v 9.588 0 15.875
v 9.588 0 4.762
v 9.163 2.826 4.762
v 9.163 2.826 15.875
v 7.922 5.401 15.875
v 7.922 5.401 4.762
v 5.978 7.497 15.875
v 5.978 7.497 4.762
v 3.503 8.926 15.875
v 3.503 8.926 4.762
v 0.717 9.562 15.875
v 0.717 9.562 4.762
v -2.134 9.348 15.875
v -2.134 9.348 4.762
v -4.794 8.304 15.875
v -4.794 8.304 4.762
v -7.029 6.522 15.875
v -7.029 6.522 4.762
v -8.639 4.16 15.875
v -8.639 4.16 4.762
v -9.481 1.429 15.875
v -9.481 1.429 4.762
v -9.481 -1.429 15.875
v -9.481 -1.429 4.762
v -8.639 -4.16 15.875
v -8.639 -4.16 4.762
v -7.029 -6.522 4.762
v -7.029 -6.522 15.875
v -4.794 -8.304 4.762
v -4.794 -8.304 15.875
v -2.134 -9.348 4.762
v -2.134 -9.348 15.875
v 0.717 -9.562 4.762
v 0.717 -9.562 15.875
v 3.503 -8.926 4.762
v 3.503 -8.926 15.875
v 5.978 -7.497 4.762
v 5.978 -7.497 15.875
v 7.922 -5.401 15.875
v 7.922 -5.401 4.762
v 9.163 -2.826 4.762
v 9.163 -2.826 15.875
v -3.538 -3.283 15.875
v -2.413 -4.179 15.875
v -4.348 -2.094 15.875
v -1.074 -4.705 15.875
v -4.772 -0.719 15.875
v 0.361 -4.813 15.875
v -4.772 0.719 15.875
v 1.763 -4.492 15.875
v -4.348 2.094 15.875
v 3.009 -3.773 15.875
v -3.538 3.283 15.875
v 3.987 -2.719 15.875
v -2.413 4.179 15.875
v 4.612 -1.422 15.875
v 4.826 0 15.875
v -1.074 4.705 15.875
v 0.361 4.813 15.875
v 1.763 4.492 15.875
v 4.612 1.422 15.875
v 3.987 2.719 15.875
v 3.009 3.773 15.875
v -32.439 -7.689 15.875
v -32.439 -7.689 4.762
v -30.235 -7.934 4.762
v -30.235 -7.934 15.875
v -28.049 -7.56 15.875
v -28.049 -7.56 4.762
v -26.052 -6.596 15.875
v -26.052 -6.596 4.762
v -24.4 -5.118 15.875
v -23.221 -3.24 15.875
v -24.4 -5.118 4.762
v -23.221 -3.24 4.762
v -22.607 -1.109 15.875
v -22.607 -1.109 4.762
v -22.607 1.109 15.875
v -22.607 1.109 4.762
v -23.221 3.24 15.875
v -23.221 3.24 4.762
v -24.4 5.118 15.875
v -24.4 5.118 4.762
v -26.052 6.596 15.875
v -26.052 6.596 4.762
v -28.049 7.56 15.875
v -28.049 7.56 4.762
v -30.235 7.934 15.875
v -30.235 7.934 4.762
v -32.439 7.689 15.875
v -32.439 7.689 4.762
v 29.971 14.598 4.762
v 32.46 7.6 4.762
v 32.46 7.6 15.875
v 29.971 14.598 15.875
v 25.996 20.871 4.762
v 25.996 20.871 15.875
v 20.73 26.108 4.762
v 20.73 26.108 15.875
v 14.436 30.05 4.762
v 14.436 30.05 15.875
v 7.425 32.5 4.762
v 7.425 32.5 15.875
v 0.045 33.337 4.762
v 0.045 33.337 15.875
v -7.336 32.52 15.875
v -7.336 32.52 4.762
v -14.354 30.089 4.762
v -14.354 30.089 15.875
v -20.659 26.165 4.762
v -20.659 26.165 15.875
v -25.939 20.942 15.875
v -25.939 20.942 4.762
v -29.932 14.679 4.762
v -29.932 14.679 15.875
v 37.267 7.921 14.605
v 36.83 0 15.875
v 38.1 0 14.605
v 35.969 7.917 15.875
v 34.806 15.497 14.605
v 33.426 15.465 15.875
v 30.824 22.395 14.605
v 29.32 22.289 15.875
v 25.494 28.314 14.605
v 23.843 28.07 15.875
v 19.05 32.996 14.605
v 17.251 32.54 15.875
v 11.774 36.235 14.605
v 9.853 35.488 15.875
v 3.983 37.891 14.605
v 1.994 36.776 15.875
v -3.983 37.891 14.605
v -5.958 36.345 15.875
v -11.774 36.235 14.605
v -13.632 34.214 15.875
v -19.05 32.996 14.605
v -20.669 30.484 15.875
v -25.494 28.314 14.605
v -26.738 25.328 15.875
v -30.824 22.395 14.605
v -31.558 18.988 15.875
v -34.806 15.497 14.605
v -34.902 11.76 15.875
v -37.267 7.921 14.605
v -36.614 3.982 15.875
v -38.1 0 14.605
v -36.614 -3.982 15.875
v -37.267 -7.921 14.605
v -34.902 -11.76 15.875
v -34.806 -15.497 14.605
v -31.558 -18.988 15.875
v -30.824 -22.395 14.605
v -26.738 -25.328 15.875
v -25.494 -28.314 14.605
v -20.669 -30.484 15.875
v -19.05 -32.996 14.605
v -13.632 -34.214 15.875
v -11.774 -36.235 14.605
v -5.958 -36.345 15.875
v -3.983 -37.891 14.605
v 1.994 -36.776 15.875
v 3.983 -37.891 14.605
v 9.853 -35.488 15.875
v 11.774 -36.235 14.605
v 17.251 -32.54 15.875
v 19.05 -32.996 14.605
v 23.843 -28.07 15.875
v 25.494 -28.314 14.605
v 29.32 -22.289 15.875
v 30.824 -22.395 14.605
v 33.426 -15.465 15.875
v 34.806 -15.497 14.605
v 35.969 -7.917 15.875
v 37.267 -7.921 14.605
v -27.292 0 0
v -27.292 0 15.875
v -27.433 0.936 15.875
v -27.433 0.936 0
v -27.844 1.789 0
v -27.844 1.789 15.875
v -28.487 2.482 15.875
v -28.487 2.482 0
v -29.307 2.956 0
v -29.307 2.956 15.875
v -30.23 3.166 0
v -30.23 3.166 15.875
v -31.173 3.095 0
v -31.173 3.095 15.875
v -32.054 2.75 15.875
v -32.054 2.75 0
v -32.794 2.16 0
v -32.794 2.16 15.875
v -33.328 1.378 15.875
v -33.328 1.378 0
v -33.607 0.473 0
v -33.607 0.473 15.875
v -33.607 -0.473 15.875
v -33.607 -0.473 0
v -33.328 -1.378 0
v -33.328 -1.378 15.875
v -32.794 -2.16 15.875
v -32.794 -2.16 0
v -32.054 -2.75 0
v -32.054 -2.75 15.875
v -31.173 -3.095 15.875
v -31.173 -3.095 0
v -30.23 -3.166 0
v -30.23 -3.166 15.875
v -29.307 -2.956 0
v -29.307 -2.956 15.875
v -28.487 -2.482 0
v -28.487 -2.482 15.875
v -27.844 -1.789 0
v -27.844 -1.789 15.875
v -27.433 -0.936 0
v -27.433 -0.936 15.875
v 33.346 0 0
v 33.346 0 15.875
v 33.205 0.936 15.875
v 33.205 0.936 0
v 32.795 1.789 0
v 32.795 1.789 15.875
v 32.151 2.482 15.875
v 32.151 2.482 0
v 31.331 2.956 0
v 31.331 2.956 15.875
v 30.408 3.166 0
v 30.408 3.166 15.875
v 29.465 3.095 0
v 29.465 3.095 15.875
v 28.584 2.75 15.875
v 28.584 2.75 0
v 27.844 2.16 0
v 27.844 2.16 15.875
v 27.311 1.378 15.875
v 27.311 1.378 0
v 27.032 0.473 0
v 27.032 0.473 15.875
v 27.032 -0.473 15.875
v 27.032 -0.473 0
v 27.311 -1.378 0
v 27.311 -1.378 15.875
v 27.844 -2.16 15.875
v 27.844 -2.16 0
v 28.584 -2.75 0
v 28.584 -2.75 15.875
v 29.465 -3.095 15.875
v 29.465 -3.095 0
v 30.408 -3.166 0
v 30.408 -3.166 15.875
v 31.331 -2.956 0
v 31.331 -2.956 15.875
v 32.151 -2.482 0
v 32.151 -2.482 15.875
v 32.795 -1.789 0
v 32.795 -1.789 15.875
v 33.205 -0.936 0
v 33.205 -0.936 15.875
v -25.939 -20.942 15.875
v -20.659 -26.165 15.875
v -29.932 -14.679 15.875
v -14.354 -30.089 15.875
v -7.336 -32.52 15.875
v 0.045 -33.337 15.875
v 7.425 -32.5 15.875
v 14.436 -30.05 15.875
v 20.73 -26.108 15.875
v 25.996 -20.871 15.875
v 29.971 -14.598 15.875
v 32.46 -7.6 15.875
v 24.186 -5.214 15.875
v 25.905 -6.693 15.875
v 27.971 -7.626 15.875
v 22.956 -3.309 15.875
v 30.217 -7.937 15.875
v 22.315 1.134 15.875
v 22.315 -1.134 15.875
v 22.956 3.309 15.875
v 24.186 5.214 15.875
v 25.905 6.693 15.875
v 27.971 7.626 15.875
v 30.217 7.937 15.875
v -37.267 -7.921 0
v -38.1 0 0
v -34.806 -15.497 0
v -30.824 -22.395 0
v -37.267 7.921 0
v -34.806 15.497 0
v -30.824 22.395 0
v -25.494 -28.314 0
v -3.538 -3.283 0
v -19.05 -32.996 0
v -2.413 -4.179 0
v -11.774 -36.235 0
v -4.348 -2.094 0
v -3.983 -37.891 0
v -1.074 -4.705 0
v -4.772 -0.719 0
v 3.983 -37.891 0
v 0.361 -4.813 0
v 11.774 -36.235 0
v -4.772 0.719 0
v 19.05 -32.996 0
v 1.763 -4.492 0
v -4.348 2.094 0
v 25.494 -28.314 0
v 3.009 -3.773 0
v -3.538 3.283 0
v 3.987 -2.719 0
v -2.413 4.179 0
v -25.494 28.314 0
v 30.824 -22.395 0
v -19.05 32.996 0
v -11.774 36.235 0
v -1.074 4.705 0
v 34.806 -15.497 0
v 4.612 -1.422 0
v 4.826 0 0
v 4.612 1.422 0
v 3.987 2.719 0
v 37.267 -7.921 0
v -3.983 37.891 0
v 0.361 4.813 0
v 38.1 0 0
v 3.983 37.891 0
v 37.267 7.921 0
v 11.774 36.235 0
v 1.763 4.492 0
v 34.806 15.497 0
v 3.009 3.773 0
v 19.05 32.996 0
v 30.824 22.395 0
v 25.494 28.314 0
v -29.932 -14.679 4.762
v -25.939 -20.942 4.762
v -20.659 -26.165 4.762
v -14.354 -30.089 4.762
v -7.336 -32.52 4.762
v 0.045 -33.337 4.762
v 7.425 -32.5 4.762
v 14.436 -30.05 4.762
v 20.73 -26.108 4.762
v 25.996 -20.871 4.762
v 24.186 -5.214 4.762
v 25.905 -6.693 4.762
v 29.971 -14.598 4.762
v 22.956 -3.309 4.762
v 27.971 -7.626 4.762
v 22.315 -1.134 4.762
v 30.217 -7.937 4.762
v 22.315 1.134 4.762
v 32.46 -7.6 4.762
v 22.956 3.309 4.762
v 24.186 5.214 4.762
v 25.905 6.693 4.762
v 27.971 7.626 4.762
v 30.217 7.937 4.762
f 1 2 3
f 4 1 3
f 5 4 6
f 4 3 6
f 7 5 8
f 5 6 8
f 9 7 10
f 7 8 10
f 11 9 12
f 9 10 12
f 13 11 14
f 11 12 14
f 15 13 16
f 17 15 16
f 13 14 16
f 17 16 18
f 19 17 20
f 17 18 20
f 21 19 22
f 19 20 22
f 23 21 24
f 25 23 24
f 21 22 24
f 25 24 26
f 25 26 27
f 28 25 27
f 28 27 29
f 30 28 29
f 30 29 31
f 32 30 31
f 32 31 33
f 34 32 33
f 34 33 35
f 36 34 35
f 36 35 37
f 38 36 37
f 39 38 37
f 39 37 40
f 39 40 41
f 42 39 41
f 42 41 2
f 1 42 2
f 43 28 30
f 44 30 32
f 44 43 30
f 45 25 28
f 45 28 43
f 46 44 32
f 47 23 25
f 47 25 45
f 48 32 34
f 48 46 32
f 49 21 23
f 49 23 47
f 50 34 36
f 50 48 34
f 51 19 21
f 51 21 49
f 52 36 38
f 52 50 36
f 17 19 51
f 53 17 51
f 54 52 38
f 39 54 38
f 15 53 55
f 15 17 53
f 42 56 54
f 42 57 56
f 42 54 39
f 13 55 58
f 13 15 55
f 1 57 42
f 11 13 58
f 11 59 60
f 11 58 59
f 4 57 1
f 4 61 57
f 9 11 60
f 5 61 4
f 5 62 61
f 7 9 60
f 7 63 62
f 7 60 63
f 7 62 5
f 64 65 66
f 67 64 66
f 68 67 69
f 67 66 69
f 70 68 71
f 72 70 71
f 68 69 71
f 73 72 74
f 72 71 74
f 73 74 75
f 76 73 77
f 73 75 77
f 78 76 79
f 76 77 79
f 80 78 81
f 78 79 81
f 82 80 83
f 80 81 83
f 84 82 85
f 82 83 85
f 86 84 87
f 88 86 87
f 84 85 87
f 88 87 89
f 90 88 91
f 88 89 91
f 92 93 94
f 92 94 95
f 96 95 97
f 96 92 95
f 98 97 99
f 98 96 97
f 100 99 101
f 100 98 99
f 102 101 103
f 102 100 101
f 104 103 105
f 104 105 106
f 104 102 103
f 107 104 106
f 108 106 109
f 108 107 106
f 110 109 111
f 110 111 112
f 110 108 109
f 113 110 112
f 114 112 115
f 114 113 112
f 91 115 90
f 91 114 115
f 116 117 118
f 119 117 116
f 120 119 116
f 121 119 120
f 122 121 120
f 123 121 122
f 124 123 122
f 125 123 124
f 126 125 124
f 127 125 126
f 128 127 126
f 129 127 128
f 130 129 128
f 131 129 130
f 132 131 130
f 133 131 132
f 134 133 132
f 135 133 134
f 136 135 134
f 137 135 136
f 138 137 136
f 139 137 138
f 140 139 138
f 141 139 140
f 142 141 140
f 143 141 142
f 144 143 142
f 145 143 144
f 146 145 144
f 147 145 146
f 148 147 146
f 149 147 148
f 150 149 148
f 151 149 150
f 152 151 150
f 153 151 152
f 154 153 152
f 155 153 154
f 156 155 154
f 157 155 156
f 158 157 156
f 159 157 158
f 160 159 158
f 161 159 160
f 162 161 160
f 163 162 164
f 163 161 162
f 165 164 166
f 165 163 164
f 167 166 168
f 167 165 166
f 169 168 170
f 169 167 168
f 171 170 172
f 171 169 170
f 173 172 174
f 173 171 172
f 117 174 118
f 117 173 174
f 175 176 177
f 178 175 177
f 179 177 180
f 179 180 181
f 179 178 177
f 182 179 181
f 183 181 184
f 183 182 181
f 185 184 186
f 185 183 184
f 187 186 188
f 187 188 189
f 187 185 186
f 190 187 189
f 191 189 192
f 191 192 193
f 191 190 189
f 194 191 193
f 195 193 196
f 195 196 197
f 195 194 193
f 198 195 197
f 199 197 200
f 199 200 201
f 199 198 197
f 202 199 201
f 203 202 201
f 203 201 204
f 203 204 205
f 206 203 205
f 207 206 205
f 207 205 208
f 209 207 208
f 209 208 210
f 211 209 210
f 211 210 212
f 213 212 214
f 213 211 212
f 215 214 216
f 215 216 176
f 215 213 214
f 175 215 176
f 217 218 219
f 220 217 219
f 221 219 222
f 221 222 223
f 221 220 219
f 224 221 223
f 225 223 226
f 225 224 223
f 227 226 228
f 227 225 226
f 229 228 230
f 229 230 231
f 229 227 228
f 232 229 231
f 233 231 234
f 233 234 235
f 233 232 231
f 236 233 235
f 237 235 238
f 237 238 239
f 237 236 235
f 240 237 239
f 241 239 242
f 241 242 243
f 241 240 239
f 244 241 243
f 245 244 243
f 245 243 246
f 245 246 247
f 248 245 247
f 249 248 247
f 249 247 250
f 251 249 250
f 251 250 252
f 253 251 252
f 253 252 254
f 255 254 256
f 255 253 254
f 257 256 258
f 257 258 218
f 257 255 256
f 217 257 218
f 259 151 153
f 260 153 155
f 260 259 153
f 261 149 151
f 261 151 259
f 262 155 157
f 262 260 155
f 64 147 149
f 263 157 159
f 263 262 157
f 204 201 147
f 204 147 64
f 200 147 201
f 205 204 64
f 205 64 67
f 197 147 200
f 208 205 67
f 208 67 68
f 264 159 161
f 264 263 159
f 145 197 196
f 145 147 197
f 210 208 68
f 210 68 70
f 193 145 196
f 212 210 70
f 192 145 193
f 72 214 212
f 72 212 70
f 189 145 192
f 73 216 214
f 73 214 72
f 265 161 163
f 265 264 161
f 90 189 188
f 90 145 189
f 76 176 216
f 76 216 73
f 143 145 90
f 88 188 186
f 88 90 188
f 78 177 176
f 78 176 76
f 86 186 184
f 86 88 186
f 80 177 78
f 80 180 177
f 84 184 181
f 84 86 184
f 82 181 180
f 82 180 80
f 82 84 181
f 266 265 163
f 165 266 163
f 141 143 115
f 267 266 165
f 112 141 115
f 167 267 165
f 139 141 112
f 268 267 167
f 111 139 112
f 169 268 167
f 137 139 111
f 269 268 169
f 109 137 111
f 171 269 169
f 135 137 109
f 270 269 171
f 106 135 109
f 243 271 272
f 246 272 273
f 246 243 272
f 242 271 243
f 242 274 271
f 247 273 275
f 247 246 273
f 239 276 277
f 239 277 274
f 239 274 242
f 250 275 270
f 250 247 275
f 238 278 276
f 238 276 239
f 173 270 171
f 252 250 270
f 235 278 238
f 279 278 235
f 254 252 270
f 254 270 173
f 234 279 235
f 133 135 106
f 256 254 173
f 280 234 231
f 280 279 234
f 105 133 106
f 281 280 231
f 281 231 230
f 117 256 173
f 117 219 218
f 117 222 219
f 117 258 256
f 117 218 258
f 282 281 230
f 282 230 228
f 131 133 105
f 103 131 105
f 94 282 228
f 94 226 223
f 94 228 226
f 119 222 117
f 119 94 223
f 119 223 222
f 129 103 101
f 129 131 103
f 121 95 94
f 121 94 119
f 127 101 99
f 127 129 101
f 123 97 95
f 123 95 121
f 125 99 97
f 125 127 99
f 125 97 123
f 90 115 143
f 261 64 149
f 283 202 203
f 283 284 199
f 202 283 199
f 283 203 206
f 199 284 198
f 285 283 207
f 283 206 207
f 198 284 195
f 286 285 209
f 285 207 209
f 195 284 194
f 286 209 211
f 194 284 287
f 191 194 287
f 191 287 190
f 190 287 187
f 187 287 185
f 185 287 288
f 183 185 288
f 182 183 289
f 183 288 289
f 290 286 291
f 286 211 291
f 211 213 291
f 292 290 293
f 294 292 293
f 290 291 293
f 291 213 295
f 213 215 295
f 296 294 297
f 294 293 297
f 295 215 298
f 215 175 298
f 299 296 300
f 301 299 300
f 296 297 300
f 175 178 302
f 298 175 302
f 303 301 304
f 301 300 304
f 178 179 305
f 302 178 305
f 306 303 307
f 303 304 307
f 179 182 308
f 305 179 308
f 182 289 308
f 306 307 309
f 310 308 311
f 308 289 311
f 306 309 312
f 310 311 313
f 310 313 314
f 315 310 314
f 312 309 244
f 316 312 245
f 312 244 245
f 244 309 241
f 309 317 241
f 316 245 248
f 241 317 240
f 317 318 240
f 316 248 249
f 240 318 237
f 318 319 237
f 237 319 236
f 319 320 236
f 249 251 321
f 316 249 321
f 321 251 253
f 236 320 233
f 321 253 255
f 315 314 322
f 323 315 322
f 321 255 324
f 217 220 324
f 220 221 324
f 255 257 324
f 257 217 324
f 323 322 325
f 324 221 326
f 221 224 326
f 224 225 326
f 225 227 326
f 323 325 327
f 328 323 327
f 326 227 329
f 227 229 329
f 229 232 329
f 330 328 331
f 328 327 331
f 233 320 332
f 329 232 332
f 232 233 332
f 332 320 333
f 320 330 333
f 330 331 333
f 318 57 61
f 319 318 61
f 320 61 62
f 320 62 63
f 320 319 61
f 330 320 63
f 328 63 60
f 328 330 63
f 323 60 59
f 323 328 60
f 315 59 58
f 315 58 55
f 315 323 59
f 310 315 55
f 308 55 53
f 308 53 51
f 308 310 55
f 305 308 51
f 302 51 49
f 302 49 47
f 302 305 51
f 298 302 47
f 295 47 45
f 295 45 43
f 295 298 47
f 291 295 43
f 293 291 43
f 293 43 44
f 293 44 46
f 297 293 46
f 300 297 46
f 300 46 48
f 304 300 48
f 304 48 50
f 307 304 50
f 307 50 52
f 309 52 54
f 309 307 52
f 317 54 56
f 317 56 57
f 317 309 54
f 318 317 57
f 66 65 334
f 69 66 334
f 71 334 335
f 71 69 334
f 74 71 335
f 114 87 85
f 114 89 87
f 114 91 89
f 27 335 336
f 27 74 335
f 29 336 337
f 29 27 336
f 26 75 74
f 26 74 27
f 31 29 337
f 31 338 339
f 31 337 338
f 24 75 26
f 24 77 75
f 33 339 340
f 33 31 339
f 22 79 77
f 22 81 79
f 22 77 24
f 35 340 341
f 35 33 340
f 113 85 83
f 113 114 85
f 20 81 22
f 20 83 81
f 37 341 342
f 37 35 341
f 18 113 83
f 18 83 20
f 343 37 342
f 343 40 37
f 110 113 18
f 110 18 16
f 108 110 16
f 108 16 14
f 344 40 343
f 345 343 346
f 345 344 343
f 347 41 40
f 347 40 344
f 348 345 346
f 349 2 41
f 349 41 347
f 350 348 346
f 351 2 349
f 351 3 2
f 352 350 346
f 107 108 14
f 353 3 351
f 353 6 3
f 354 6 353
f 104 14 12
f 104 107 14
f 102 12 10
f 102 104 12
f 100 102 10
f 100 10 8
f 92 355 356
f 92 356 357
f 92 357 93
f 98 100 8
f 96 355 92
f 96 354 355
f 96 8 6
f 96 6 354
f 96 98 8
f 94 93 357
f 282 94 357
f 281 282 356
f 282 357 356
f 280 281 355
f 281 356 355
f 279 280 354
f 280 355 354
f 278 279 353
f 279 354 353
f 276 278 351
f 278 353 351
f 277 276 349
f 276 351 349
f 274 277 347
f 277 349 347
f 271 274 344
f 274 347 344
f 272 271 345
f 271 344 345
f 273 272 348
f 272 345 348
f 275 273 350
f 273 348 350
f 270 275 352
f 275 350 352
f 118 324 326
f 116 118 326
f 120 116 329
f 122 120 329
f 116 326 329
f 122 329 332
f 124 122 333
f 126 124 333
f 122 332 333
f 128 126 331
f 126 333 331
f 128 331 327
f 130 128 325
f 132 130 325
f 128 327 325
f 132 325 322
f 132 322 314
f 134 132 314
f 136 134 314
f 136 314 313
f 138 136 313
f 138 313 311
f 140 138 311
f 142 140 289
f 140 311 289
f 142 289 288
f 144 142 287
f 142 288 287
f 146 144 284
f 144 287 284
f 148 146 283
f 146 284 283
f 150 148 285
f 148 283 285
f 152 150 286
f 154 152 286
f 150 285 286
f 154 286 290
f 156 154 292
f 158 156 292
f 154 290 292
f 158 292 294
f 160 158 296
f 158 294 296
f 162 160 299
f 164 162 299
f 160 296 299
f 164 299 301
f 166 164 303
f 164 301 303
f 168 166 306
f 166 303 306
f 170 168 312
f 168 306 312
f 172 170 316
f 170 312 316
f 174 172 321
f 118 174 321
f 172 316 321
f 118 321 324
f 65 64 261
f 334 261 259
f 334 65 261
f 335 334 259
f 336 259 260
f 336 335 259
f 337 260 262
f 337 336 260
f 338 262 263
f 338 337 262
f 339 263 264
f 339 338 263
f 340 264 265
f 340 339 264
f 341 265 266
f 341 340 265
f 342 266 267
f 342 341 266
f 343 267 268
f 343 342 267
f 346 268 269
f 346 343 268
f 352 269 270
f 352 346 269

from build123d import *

# Parameters (mm, degrees)
F0_R     = 38.1
F0_R_2   = 3.175
F0_R_3   = 4.826
F1_DEPTH = 15.875
F2_T     = -4.7625
F3_SIZE  = 1.27


with BuildPart() as f1:
    # F0 (on Top) → F1 (new body)
    with BuildSketch(Plane.XY):
        Circle(F0_R)
        with Locations((-30.466994, 0)):
            Circle(F0_R_2, mode=Mode.SUBTRACT)
        Circle(F0_R_3, mode=Mode.SUBTRACT)
        with Locations((30.171195, 0)):
            Circle(F0_R_2, mode=Mode.SUBTRACT)
    extrude(amount=F1_DEPTH)

    # F2
    f2_openings = [f1.faces().sort_by_distance(p)[0] for p in [
        (-37.022369, 0, 15.875),
    ]]
    offset(amount=F2_T, openings=f2_openings)

    # F3
    f3_edges = [f1.edges().sort_by_distance(p)[0] for p in [
        (-38.1, 0, 15.875),
    ]]
    chamfer(f3_edges, length=F3_SIZE)


solid = f1.part
